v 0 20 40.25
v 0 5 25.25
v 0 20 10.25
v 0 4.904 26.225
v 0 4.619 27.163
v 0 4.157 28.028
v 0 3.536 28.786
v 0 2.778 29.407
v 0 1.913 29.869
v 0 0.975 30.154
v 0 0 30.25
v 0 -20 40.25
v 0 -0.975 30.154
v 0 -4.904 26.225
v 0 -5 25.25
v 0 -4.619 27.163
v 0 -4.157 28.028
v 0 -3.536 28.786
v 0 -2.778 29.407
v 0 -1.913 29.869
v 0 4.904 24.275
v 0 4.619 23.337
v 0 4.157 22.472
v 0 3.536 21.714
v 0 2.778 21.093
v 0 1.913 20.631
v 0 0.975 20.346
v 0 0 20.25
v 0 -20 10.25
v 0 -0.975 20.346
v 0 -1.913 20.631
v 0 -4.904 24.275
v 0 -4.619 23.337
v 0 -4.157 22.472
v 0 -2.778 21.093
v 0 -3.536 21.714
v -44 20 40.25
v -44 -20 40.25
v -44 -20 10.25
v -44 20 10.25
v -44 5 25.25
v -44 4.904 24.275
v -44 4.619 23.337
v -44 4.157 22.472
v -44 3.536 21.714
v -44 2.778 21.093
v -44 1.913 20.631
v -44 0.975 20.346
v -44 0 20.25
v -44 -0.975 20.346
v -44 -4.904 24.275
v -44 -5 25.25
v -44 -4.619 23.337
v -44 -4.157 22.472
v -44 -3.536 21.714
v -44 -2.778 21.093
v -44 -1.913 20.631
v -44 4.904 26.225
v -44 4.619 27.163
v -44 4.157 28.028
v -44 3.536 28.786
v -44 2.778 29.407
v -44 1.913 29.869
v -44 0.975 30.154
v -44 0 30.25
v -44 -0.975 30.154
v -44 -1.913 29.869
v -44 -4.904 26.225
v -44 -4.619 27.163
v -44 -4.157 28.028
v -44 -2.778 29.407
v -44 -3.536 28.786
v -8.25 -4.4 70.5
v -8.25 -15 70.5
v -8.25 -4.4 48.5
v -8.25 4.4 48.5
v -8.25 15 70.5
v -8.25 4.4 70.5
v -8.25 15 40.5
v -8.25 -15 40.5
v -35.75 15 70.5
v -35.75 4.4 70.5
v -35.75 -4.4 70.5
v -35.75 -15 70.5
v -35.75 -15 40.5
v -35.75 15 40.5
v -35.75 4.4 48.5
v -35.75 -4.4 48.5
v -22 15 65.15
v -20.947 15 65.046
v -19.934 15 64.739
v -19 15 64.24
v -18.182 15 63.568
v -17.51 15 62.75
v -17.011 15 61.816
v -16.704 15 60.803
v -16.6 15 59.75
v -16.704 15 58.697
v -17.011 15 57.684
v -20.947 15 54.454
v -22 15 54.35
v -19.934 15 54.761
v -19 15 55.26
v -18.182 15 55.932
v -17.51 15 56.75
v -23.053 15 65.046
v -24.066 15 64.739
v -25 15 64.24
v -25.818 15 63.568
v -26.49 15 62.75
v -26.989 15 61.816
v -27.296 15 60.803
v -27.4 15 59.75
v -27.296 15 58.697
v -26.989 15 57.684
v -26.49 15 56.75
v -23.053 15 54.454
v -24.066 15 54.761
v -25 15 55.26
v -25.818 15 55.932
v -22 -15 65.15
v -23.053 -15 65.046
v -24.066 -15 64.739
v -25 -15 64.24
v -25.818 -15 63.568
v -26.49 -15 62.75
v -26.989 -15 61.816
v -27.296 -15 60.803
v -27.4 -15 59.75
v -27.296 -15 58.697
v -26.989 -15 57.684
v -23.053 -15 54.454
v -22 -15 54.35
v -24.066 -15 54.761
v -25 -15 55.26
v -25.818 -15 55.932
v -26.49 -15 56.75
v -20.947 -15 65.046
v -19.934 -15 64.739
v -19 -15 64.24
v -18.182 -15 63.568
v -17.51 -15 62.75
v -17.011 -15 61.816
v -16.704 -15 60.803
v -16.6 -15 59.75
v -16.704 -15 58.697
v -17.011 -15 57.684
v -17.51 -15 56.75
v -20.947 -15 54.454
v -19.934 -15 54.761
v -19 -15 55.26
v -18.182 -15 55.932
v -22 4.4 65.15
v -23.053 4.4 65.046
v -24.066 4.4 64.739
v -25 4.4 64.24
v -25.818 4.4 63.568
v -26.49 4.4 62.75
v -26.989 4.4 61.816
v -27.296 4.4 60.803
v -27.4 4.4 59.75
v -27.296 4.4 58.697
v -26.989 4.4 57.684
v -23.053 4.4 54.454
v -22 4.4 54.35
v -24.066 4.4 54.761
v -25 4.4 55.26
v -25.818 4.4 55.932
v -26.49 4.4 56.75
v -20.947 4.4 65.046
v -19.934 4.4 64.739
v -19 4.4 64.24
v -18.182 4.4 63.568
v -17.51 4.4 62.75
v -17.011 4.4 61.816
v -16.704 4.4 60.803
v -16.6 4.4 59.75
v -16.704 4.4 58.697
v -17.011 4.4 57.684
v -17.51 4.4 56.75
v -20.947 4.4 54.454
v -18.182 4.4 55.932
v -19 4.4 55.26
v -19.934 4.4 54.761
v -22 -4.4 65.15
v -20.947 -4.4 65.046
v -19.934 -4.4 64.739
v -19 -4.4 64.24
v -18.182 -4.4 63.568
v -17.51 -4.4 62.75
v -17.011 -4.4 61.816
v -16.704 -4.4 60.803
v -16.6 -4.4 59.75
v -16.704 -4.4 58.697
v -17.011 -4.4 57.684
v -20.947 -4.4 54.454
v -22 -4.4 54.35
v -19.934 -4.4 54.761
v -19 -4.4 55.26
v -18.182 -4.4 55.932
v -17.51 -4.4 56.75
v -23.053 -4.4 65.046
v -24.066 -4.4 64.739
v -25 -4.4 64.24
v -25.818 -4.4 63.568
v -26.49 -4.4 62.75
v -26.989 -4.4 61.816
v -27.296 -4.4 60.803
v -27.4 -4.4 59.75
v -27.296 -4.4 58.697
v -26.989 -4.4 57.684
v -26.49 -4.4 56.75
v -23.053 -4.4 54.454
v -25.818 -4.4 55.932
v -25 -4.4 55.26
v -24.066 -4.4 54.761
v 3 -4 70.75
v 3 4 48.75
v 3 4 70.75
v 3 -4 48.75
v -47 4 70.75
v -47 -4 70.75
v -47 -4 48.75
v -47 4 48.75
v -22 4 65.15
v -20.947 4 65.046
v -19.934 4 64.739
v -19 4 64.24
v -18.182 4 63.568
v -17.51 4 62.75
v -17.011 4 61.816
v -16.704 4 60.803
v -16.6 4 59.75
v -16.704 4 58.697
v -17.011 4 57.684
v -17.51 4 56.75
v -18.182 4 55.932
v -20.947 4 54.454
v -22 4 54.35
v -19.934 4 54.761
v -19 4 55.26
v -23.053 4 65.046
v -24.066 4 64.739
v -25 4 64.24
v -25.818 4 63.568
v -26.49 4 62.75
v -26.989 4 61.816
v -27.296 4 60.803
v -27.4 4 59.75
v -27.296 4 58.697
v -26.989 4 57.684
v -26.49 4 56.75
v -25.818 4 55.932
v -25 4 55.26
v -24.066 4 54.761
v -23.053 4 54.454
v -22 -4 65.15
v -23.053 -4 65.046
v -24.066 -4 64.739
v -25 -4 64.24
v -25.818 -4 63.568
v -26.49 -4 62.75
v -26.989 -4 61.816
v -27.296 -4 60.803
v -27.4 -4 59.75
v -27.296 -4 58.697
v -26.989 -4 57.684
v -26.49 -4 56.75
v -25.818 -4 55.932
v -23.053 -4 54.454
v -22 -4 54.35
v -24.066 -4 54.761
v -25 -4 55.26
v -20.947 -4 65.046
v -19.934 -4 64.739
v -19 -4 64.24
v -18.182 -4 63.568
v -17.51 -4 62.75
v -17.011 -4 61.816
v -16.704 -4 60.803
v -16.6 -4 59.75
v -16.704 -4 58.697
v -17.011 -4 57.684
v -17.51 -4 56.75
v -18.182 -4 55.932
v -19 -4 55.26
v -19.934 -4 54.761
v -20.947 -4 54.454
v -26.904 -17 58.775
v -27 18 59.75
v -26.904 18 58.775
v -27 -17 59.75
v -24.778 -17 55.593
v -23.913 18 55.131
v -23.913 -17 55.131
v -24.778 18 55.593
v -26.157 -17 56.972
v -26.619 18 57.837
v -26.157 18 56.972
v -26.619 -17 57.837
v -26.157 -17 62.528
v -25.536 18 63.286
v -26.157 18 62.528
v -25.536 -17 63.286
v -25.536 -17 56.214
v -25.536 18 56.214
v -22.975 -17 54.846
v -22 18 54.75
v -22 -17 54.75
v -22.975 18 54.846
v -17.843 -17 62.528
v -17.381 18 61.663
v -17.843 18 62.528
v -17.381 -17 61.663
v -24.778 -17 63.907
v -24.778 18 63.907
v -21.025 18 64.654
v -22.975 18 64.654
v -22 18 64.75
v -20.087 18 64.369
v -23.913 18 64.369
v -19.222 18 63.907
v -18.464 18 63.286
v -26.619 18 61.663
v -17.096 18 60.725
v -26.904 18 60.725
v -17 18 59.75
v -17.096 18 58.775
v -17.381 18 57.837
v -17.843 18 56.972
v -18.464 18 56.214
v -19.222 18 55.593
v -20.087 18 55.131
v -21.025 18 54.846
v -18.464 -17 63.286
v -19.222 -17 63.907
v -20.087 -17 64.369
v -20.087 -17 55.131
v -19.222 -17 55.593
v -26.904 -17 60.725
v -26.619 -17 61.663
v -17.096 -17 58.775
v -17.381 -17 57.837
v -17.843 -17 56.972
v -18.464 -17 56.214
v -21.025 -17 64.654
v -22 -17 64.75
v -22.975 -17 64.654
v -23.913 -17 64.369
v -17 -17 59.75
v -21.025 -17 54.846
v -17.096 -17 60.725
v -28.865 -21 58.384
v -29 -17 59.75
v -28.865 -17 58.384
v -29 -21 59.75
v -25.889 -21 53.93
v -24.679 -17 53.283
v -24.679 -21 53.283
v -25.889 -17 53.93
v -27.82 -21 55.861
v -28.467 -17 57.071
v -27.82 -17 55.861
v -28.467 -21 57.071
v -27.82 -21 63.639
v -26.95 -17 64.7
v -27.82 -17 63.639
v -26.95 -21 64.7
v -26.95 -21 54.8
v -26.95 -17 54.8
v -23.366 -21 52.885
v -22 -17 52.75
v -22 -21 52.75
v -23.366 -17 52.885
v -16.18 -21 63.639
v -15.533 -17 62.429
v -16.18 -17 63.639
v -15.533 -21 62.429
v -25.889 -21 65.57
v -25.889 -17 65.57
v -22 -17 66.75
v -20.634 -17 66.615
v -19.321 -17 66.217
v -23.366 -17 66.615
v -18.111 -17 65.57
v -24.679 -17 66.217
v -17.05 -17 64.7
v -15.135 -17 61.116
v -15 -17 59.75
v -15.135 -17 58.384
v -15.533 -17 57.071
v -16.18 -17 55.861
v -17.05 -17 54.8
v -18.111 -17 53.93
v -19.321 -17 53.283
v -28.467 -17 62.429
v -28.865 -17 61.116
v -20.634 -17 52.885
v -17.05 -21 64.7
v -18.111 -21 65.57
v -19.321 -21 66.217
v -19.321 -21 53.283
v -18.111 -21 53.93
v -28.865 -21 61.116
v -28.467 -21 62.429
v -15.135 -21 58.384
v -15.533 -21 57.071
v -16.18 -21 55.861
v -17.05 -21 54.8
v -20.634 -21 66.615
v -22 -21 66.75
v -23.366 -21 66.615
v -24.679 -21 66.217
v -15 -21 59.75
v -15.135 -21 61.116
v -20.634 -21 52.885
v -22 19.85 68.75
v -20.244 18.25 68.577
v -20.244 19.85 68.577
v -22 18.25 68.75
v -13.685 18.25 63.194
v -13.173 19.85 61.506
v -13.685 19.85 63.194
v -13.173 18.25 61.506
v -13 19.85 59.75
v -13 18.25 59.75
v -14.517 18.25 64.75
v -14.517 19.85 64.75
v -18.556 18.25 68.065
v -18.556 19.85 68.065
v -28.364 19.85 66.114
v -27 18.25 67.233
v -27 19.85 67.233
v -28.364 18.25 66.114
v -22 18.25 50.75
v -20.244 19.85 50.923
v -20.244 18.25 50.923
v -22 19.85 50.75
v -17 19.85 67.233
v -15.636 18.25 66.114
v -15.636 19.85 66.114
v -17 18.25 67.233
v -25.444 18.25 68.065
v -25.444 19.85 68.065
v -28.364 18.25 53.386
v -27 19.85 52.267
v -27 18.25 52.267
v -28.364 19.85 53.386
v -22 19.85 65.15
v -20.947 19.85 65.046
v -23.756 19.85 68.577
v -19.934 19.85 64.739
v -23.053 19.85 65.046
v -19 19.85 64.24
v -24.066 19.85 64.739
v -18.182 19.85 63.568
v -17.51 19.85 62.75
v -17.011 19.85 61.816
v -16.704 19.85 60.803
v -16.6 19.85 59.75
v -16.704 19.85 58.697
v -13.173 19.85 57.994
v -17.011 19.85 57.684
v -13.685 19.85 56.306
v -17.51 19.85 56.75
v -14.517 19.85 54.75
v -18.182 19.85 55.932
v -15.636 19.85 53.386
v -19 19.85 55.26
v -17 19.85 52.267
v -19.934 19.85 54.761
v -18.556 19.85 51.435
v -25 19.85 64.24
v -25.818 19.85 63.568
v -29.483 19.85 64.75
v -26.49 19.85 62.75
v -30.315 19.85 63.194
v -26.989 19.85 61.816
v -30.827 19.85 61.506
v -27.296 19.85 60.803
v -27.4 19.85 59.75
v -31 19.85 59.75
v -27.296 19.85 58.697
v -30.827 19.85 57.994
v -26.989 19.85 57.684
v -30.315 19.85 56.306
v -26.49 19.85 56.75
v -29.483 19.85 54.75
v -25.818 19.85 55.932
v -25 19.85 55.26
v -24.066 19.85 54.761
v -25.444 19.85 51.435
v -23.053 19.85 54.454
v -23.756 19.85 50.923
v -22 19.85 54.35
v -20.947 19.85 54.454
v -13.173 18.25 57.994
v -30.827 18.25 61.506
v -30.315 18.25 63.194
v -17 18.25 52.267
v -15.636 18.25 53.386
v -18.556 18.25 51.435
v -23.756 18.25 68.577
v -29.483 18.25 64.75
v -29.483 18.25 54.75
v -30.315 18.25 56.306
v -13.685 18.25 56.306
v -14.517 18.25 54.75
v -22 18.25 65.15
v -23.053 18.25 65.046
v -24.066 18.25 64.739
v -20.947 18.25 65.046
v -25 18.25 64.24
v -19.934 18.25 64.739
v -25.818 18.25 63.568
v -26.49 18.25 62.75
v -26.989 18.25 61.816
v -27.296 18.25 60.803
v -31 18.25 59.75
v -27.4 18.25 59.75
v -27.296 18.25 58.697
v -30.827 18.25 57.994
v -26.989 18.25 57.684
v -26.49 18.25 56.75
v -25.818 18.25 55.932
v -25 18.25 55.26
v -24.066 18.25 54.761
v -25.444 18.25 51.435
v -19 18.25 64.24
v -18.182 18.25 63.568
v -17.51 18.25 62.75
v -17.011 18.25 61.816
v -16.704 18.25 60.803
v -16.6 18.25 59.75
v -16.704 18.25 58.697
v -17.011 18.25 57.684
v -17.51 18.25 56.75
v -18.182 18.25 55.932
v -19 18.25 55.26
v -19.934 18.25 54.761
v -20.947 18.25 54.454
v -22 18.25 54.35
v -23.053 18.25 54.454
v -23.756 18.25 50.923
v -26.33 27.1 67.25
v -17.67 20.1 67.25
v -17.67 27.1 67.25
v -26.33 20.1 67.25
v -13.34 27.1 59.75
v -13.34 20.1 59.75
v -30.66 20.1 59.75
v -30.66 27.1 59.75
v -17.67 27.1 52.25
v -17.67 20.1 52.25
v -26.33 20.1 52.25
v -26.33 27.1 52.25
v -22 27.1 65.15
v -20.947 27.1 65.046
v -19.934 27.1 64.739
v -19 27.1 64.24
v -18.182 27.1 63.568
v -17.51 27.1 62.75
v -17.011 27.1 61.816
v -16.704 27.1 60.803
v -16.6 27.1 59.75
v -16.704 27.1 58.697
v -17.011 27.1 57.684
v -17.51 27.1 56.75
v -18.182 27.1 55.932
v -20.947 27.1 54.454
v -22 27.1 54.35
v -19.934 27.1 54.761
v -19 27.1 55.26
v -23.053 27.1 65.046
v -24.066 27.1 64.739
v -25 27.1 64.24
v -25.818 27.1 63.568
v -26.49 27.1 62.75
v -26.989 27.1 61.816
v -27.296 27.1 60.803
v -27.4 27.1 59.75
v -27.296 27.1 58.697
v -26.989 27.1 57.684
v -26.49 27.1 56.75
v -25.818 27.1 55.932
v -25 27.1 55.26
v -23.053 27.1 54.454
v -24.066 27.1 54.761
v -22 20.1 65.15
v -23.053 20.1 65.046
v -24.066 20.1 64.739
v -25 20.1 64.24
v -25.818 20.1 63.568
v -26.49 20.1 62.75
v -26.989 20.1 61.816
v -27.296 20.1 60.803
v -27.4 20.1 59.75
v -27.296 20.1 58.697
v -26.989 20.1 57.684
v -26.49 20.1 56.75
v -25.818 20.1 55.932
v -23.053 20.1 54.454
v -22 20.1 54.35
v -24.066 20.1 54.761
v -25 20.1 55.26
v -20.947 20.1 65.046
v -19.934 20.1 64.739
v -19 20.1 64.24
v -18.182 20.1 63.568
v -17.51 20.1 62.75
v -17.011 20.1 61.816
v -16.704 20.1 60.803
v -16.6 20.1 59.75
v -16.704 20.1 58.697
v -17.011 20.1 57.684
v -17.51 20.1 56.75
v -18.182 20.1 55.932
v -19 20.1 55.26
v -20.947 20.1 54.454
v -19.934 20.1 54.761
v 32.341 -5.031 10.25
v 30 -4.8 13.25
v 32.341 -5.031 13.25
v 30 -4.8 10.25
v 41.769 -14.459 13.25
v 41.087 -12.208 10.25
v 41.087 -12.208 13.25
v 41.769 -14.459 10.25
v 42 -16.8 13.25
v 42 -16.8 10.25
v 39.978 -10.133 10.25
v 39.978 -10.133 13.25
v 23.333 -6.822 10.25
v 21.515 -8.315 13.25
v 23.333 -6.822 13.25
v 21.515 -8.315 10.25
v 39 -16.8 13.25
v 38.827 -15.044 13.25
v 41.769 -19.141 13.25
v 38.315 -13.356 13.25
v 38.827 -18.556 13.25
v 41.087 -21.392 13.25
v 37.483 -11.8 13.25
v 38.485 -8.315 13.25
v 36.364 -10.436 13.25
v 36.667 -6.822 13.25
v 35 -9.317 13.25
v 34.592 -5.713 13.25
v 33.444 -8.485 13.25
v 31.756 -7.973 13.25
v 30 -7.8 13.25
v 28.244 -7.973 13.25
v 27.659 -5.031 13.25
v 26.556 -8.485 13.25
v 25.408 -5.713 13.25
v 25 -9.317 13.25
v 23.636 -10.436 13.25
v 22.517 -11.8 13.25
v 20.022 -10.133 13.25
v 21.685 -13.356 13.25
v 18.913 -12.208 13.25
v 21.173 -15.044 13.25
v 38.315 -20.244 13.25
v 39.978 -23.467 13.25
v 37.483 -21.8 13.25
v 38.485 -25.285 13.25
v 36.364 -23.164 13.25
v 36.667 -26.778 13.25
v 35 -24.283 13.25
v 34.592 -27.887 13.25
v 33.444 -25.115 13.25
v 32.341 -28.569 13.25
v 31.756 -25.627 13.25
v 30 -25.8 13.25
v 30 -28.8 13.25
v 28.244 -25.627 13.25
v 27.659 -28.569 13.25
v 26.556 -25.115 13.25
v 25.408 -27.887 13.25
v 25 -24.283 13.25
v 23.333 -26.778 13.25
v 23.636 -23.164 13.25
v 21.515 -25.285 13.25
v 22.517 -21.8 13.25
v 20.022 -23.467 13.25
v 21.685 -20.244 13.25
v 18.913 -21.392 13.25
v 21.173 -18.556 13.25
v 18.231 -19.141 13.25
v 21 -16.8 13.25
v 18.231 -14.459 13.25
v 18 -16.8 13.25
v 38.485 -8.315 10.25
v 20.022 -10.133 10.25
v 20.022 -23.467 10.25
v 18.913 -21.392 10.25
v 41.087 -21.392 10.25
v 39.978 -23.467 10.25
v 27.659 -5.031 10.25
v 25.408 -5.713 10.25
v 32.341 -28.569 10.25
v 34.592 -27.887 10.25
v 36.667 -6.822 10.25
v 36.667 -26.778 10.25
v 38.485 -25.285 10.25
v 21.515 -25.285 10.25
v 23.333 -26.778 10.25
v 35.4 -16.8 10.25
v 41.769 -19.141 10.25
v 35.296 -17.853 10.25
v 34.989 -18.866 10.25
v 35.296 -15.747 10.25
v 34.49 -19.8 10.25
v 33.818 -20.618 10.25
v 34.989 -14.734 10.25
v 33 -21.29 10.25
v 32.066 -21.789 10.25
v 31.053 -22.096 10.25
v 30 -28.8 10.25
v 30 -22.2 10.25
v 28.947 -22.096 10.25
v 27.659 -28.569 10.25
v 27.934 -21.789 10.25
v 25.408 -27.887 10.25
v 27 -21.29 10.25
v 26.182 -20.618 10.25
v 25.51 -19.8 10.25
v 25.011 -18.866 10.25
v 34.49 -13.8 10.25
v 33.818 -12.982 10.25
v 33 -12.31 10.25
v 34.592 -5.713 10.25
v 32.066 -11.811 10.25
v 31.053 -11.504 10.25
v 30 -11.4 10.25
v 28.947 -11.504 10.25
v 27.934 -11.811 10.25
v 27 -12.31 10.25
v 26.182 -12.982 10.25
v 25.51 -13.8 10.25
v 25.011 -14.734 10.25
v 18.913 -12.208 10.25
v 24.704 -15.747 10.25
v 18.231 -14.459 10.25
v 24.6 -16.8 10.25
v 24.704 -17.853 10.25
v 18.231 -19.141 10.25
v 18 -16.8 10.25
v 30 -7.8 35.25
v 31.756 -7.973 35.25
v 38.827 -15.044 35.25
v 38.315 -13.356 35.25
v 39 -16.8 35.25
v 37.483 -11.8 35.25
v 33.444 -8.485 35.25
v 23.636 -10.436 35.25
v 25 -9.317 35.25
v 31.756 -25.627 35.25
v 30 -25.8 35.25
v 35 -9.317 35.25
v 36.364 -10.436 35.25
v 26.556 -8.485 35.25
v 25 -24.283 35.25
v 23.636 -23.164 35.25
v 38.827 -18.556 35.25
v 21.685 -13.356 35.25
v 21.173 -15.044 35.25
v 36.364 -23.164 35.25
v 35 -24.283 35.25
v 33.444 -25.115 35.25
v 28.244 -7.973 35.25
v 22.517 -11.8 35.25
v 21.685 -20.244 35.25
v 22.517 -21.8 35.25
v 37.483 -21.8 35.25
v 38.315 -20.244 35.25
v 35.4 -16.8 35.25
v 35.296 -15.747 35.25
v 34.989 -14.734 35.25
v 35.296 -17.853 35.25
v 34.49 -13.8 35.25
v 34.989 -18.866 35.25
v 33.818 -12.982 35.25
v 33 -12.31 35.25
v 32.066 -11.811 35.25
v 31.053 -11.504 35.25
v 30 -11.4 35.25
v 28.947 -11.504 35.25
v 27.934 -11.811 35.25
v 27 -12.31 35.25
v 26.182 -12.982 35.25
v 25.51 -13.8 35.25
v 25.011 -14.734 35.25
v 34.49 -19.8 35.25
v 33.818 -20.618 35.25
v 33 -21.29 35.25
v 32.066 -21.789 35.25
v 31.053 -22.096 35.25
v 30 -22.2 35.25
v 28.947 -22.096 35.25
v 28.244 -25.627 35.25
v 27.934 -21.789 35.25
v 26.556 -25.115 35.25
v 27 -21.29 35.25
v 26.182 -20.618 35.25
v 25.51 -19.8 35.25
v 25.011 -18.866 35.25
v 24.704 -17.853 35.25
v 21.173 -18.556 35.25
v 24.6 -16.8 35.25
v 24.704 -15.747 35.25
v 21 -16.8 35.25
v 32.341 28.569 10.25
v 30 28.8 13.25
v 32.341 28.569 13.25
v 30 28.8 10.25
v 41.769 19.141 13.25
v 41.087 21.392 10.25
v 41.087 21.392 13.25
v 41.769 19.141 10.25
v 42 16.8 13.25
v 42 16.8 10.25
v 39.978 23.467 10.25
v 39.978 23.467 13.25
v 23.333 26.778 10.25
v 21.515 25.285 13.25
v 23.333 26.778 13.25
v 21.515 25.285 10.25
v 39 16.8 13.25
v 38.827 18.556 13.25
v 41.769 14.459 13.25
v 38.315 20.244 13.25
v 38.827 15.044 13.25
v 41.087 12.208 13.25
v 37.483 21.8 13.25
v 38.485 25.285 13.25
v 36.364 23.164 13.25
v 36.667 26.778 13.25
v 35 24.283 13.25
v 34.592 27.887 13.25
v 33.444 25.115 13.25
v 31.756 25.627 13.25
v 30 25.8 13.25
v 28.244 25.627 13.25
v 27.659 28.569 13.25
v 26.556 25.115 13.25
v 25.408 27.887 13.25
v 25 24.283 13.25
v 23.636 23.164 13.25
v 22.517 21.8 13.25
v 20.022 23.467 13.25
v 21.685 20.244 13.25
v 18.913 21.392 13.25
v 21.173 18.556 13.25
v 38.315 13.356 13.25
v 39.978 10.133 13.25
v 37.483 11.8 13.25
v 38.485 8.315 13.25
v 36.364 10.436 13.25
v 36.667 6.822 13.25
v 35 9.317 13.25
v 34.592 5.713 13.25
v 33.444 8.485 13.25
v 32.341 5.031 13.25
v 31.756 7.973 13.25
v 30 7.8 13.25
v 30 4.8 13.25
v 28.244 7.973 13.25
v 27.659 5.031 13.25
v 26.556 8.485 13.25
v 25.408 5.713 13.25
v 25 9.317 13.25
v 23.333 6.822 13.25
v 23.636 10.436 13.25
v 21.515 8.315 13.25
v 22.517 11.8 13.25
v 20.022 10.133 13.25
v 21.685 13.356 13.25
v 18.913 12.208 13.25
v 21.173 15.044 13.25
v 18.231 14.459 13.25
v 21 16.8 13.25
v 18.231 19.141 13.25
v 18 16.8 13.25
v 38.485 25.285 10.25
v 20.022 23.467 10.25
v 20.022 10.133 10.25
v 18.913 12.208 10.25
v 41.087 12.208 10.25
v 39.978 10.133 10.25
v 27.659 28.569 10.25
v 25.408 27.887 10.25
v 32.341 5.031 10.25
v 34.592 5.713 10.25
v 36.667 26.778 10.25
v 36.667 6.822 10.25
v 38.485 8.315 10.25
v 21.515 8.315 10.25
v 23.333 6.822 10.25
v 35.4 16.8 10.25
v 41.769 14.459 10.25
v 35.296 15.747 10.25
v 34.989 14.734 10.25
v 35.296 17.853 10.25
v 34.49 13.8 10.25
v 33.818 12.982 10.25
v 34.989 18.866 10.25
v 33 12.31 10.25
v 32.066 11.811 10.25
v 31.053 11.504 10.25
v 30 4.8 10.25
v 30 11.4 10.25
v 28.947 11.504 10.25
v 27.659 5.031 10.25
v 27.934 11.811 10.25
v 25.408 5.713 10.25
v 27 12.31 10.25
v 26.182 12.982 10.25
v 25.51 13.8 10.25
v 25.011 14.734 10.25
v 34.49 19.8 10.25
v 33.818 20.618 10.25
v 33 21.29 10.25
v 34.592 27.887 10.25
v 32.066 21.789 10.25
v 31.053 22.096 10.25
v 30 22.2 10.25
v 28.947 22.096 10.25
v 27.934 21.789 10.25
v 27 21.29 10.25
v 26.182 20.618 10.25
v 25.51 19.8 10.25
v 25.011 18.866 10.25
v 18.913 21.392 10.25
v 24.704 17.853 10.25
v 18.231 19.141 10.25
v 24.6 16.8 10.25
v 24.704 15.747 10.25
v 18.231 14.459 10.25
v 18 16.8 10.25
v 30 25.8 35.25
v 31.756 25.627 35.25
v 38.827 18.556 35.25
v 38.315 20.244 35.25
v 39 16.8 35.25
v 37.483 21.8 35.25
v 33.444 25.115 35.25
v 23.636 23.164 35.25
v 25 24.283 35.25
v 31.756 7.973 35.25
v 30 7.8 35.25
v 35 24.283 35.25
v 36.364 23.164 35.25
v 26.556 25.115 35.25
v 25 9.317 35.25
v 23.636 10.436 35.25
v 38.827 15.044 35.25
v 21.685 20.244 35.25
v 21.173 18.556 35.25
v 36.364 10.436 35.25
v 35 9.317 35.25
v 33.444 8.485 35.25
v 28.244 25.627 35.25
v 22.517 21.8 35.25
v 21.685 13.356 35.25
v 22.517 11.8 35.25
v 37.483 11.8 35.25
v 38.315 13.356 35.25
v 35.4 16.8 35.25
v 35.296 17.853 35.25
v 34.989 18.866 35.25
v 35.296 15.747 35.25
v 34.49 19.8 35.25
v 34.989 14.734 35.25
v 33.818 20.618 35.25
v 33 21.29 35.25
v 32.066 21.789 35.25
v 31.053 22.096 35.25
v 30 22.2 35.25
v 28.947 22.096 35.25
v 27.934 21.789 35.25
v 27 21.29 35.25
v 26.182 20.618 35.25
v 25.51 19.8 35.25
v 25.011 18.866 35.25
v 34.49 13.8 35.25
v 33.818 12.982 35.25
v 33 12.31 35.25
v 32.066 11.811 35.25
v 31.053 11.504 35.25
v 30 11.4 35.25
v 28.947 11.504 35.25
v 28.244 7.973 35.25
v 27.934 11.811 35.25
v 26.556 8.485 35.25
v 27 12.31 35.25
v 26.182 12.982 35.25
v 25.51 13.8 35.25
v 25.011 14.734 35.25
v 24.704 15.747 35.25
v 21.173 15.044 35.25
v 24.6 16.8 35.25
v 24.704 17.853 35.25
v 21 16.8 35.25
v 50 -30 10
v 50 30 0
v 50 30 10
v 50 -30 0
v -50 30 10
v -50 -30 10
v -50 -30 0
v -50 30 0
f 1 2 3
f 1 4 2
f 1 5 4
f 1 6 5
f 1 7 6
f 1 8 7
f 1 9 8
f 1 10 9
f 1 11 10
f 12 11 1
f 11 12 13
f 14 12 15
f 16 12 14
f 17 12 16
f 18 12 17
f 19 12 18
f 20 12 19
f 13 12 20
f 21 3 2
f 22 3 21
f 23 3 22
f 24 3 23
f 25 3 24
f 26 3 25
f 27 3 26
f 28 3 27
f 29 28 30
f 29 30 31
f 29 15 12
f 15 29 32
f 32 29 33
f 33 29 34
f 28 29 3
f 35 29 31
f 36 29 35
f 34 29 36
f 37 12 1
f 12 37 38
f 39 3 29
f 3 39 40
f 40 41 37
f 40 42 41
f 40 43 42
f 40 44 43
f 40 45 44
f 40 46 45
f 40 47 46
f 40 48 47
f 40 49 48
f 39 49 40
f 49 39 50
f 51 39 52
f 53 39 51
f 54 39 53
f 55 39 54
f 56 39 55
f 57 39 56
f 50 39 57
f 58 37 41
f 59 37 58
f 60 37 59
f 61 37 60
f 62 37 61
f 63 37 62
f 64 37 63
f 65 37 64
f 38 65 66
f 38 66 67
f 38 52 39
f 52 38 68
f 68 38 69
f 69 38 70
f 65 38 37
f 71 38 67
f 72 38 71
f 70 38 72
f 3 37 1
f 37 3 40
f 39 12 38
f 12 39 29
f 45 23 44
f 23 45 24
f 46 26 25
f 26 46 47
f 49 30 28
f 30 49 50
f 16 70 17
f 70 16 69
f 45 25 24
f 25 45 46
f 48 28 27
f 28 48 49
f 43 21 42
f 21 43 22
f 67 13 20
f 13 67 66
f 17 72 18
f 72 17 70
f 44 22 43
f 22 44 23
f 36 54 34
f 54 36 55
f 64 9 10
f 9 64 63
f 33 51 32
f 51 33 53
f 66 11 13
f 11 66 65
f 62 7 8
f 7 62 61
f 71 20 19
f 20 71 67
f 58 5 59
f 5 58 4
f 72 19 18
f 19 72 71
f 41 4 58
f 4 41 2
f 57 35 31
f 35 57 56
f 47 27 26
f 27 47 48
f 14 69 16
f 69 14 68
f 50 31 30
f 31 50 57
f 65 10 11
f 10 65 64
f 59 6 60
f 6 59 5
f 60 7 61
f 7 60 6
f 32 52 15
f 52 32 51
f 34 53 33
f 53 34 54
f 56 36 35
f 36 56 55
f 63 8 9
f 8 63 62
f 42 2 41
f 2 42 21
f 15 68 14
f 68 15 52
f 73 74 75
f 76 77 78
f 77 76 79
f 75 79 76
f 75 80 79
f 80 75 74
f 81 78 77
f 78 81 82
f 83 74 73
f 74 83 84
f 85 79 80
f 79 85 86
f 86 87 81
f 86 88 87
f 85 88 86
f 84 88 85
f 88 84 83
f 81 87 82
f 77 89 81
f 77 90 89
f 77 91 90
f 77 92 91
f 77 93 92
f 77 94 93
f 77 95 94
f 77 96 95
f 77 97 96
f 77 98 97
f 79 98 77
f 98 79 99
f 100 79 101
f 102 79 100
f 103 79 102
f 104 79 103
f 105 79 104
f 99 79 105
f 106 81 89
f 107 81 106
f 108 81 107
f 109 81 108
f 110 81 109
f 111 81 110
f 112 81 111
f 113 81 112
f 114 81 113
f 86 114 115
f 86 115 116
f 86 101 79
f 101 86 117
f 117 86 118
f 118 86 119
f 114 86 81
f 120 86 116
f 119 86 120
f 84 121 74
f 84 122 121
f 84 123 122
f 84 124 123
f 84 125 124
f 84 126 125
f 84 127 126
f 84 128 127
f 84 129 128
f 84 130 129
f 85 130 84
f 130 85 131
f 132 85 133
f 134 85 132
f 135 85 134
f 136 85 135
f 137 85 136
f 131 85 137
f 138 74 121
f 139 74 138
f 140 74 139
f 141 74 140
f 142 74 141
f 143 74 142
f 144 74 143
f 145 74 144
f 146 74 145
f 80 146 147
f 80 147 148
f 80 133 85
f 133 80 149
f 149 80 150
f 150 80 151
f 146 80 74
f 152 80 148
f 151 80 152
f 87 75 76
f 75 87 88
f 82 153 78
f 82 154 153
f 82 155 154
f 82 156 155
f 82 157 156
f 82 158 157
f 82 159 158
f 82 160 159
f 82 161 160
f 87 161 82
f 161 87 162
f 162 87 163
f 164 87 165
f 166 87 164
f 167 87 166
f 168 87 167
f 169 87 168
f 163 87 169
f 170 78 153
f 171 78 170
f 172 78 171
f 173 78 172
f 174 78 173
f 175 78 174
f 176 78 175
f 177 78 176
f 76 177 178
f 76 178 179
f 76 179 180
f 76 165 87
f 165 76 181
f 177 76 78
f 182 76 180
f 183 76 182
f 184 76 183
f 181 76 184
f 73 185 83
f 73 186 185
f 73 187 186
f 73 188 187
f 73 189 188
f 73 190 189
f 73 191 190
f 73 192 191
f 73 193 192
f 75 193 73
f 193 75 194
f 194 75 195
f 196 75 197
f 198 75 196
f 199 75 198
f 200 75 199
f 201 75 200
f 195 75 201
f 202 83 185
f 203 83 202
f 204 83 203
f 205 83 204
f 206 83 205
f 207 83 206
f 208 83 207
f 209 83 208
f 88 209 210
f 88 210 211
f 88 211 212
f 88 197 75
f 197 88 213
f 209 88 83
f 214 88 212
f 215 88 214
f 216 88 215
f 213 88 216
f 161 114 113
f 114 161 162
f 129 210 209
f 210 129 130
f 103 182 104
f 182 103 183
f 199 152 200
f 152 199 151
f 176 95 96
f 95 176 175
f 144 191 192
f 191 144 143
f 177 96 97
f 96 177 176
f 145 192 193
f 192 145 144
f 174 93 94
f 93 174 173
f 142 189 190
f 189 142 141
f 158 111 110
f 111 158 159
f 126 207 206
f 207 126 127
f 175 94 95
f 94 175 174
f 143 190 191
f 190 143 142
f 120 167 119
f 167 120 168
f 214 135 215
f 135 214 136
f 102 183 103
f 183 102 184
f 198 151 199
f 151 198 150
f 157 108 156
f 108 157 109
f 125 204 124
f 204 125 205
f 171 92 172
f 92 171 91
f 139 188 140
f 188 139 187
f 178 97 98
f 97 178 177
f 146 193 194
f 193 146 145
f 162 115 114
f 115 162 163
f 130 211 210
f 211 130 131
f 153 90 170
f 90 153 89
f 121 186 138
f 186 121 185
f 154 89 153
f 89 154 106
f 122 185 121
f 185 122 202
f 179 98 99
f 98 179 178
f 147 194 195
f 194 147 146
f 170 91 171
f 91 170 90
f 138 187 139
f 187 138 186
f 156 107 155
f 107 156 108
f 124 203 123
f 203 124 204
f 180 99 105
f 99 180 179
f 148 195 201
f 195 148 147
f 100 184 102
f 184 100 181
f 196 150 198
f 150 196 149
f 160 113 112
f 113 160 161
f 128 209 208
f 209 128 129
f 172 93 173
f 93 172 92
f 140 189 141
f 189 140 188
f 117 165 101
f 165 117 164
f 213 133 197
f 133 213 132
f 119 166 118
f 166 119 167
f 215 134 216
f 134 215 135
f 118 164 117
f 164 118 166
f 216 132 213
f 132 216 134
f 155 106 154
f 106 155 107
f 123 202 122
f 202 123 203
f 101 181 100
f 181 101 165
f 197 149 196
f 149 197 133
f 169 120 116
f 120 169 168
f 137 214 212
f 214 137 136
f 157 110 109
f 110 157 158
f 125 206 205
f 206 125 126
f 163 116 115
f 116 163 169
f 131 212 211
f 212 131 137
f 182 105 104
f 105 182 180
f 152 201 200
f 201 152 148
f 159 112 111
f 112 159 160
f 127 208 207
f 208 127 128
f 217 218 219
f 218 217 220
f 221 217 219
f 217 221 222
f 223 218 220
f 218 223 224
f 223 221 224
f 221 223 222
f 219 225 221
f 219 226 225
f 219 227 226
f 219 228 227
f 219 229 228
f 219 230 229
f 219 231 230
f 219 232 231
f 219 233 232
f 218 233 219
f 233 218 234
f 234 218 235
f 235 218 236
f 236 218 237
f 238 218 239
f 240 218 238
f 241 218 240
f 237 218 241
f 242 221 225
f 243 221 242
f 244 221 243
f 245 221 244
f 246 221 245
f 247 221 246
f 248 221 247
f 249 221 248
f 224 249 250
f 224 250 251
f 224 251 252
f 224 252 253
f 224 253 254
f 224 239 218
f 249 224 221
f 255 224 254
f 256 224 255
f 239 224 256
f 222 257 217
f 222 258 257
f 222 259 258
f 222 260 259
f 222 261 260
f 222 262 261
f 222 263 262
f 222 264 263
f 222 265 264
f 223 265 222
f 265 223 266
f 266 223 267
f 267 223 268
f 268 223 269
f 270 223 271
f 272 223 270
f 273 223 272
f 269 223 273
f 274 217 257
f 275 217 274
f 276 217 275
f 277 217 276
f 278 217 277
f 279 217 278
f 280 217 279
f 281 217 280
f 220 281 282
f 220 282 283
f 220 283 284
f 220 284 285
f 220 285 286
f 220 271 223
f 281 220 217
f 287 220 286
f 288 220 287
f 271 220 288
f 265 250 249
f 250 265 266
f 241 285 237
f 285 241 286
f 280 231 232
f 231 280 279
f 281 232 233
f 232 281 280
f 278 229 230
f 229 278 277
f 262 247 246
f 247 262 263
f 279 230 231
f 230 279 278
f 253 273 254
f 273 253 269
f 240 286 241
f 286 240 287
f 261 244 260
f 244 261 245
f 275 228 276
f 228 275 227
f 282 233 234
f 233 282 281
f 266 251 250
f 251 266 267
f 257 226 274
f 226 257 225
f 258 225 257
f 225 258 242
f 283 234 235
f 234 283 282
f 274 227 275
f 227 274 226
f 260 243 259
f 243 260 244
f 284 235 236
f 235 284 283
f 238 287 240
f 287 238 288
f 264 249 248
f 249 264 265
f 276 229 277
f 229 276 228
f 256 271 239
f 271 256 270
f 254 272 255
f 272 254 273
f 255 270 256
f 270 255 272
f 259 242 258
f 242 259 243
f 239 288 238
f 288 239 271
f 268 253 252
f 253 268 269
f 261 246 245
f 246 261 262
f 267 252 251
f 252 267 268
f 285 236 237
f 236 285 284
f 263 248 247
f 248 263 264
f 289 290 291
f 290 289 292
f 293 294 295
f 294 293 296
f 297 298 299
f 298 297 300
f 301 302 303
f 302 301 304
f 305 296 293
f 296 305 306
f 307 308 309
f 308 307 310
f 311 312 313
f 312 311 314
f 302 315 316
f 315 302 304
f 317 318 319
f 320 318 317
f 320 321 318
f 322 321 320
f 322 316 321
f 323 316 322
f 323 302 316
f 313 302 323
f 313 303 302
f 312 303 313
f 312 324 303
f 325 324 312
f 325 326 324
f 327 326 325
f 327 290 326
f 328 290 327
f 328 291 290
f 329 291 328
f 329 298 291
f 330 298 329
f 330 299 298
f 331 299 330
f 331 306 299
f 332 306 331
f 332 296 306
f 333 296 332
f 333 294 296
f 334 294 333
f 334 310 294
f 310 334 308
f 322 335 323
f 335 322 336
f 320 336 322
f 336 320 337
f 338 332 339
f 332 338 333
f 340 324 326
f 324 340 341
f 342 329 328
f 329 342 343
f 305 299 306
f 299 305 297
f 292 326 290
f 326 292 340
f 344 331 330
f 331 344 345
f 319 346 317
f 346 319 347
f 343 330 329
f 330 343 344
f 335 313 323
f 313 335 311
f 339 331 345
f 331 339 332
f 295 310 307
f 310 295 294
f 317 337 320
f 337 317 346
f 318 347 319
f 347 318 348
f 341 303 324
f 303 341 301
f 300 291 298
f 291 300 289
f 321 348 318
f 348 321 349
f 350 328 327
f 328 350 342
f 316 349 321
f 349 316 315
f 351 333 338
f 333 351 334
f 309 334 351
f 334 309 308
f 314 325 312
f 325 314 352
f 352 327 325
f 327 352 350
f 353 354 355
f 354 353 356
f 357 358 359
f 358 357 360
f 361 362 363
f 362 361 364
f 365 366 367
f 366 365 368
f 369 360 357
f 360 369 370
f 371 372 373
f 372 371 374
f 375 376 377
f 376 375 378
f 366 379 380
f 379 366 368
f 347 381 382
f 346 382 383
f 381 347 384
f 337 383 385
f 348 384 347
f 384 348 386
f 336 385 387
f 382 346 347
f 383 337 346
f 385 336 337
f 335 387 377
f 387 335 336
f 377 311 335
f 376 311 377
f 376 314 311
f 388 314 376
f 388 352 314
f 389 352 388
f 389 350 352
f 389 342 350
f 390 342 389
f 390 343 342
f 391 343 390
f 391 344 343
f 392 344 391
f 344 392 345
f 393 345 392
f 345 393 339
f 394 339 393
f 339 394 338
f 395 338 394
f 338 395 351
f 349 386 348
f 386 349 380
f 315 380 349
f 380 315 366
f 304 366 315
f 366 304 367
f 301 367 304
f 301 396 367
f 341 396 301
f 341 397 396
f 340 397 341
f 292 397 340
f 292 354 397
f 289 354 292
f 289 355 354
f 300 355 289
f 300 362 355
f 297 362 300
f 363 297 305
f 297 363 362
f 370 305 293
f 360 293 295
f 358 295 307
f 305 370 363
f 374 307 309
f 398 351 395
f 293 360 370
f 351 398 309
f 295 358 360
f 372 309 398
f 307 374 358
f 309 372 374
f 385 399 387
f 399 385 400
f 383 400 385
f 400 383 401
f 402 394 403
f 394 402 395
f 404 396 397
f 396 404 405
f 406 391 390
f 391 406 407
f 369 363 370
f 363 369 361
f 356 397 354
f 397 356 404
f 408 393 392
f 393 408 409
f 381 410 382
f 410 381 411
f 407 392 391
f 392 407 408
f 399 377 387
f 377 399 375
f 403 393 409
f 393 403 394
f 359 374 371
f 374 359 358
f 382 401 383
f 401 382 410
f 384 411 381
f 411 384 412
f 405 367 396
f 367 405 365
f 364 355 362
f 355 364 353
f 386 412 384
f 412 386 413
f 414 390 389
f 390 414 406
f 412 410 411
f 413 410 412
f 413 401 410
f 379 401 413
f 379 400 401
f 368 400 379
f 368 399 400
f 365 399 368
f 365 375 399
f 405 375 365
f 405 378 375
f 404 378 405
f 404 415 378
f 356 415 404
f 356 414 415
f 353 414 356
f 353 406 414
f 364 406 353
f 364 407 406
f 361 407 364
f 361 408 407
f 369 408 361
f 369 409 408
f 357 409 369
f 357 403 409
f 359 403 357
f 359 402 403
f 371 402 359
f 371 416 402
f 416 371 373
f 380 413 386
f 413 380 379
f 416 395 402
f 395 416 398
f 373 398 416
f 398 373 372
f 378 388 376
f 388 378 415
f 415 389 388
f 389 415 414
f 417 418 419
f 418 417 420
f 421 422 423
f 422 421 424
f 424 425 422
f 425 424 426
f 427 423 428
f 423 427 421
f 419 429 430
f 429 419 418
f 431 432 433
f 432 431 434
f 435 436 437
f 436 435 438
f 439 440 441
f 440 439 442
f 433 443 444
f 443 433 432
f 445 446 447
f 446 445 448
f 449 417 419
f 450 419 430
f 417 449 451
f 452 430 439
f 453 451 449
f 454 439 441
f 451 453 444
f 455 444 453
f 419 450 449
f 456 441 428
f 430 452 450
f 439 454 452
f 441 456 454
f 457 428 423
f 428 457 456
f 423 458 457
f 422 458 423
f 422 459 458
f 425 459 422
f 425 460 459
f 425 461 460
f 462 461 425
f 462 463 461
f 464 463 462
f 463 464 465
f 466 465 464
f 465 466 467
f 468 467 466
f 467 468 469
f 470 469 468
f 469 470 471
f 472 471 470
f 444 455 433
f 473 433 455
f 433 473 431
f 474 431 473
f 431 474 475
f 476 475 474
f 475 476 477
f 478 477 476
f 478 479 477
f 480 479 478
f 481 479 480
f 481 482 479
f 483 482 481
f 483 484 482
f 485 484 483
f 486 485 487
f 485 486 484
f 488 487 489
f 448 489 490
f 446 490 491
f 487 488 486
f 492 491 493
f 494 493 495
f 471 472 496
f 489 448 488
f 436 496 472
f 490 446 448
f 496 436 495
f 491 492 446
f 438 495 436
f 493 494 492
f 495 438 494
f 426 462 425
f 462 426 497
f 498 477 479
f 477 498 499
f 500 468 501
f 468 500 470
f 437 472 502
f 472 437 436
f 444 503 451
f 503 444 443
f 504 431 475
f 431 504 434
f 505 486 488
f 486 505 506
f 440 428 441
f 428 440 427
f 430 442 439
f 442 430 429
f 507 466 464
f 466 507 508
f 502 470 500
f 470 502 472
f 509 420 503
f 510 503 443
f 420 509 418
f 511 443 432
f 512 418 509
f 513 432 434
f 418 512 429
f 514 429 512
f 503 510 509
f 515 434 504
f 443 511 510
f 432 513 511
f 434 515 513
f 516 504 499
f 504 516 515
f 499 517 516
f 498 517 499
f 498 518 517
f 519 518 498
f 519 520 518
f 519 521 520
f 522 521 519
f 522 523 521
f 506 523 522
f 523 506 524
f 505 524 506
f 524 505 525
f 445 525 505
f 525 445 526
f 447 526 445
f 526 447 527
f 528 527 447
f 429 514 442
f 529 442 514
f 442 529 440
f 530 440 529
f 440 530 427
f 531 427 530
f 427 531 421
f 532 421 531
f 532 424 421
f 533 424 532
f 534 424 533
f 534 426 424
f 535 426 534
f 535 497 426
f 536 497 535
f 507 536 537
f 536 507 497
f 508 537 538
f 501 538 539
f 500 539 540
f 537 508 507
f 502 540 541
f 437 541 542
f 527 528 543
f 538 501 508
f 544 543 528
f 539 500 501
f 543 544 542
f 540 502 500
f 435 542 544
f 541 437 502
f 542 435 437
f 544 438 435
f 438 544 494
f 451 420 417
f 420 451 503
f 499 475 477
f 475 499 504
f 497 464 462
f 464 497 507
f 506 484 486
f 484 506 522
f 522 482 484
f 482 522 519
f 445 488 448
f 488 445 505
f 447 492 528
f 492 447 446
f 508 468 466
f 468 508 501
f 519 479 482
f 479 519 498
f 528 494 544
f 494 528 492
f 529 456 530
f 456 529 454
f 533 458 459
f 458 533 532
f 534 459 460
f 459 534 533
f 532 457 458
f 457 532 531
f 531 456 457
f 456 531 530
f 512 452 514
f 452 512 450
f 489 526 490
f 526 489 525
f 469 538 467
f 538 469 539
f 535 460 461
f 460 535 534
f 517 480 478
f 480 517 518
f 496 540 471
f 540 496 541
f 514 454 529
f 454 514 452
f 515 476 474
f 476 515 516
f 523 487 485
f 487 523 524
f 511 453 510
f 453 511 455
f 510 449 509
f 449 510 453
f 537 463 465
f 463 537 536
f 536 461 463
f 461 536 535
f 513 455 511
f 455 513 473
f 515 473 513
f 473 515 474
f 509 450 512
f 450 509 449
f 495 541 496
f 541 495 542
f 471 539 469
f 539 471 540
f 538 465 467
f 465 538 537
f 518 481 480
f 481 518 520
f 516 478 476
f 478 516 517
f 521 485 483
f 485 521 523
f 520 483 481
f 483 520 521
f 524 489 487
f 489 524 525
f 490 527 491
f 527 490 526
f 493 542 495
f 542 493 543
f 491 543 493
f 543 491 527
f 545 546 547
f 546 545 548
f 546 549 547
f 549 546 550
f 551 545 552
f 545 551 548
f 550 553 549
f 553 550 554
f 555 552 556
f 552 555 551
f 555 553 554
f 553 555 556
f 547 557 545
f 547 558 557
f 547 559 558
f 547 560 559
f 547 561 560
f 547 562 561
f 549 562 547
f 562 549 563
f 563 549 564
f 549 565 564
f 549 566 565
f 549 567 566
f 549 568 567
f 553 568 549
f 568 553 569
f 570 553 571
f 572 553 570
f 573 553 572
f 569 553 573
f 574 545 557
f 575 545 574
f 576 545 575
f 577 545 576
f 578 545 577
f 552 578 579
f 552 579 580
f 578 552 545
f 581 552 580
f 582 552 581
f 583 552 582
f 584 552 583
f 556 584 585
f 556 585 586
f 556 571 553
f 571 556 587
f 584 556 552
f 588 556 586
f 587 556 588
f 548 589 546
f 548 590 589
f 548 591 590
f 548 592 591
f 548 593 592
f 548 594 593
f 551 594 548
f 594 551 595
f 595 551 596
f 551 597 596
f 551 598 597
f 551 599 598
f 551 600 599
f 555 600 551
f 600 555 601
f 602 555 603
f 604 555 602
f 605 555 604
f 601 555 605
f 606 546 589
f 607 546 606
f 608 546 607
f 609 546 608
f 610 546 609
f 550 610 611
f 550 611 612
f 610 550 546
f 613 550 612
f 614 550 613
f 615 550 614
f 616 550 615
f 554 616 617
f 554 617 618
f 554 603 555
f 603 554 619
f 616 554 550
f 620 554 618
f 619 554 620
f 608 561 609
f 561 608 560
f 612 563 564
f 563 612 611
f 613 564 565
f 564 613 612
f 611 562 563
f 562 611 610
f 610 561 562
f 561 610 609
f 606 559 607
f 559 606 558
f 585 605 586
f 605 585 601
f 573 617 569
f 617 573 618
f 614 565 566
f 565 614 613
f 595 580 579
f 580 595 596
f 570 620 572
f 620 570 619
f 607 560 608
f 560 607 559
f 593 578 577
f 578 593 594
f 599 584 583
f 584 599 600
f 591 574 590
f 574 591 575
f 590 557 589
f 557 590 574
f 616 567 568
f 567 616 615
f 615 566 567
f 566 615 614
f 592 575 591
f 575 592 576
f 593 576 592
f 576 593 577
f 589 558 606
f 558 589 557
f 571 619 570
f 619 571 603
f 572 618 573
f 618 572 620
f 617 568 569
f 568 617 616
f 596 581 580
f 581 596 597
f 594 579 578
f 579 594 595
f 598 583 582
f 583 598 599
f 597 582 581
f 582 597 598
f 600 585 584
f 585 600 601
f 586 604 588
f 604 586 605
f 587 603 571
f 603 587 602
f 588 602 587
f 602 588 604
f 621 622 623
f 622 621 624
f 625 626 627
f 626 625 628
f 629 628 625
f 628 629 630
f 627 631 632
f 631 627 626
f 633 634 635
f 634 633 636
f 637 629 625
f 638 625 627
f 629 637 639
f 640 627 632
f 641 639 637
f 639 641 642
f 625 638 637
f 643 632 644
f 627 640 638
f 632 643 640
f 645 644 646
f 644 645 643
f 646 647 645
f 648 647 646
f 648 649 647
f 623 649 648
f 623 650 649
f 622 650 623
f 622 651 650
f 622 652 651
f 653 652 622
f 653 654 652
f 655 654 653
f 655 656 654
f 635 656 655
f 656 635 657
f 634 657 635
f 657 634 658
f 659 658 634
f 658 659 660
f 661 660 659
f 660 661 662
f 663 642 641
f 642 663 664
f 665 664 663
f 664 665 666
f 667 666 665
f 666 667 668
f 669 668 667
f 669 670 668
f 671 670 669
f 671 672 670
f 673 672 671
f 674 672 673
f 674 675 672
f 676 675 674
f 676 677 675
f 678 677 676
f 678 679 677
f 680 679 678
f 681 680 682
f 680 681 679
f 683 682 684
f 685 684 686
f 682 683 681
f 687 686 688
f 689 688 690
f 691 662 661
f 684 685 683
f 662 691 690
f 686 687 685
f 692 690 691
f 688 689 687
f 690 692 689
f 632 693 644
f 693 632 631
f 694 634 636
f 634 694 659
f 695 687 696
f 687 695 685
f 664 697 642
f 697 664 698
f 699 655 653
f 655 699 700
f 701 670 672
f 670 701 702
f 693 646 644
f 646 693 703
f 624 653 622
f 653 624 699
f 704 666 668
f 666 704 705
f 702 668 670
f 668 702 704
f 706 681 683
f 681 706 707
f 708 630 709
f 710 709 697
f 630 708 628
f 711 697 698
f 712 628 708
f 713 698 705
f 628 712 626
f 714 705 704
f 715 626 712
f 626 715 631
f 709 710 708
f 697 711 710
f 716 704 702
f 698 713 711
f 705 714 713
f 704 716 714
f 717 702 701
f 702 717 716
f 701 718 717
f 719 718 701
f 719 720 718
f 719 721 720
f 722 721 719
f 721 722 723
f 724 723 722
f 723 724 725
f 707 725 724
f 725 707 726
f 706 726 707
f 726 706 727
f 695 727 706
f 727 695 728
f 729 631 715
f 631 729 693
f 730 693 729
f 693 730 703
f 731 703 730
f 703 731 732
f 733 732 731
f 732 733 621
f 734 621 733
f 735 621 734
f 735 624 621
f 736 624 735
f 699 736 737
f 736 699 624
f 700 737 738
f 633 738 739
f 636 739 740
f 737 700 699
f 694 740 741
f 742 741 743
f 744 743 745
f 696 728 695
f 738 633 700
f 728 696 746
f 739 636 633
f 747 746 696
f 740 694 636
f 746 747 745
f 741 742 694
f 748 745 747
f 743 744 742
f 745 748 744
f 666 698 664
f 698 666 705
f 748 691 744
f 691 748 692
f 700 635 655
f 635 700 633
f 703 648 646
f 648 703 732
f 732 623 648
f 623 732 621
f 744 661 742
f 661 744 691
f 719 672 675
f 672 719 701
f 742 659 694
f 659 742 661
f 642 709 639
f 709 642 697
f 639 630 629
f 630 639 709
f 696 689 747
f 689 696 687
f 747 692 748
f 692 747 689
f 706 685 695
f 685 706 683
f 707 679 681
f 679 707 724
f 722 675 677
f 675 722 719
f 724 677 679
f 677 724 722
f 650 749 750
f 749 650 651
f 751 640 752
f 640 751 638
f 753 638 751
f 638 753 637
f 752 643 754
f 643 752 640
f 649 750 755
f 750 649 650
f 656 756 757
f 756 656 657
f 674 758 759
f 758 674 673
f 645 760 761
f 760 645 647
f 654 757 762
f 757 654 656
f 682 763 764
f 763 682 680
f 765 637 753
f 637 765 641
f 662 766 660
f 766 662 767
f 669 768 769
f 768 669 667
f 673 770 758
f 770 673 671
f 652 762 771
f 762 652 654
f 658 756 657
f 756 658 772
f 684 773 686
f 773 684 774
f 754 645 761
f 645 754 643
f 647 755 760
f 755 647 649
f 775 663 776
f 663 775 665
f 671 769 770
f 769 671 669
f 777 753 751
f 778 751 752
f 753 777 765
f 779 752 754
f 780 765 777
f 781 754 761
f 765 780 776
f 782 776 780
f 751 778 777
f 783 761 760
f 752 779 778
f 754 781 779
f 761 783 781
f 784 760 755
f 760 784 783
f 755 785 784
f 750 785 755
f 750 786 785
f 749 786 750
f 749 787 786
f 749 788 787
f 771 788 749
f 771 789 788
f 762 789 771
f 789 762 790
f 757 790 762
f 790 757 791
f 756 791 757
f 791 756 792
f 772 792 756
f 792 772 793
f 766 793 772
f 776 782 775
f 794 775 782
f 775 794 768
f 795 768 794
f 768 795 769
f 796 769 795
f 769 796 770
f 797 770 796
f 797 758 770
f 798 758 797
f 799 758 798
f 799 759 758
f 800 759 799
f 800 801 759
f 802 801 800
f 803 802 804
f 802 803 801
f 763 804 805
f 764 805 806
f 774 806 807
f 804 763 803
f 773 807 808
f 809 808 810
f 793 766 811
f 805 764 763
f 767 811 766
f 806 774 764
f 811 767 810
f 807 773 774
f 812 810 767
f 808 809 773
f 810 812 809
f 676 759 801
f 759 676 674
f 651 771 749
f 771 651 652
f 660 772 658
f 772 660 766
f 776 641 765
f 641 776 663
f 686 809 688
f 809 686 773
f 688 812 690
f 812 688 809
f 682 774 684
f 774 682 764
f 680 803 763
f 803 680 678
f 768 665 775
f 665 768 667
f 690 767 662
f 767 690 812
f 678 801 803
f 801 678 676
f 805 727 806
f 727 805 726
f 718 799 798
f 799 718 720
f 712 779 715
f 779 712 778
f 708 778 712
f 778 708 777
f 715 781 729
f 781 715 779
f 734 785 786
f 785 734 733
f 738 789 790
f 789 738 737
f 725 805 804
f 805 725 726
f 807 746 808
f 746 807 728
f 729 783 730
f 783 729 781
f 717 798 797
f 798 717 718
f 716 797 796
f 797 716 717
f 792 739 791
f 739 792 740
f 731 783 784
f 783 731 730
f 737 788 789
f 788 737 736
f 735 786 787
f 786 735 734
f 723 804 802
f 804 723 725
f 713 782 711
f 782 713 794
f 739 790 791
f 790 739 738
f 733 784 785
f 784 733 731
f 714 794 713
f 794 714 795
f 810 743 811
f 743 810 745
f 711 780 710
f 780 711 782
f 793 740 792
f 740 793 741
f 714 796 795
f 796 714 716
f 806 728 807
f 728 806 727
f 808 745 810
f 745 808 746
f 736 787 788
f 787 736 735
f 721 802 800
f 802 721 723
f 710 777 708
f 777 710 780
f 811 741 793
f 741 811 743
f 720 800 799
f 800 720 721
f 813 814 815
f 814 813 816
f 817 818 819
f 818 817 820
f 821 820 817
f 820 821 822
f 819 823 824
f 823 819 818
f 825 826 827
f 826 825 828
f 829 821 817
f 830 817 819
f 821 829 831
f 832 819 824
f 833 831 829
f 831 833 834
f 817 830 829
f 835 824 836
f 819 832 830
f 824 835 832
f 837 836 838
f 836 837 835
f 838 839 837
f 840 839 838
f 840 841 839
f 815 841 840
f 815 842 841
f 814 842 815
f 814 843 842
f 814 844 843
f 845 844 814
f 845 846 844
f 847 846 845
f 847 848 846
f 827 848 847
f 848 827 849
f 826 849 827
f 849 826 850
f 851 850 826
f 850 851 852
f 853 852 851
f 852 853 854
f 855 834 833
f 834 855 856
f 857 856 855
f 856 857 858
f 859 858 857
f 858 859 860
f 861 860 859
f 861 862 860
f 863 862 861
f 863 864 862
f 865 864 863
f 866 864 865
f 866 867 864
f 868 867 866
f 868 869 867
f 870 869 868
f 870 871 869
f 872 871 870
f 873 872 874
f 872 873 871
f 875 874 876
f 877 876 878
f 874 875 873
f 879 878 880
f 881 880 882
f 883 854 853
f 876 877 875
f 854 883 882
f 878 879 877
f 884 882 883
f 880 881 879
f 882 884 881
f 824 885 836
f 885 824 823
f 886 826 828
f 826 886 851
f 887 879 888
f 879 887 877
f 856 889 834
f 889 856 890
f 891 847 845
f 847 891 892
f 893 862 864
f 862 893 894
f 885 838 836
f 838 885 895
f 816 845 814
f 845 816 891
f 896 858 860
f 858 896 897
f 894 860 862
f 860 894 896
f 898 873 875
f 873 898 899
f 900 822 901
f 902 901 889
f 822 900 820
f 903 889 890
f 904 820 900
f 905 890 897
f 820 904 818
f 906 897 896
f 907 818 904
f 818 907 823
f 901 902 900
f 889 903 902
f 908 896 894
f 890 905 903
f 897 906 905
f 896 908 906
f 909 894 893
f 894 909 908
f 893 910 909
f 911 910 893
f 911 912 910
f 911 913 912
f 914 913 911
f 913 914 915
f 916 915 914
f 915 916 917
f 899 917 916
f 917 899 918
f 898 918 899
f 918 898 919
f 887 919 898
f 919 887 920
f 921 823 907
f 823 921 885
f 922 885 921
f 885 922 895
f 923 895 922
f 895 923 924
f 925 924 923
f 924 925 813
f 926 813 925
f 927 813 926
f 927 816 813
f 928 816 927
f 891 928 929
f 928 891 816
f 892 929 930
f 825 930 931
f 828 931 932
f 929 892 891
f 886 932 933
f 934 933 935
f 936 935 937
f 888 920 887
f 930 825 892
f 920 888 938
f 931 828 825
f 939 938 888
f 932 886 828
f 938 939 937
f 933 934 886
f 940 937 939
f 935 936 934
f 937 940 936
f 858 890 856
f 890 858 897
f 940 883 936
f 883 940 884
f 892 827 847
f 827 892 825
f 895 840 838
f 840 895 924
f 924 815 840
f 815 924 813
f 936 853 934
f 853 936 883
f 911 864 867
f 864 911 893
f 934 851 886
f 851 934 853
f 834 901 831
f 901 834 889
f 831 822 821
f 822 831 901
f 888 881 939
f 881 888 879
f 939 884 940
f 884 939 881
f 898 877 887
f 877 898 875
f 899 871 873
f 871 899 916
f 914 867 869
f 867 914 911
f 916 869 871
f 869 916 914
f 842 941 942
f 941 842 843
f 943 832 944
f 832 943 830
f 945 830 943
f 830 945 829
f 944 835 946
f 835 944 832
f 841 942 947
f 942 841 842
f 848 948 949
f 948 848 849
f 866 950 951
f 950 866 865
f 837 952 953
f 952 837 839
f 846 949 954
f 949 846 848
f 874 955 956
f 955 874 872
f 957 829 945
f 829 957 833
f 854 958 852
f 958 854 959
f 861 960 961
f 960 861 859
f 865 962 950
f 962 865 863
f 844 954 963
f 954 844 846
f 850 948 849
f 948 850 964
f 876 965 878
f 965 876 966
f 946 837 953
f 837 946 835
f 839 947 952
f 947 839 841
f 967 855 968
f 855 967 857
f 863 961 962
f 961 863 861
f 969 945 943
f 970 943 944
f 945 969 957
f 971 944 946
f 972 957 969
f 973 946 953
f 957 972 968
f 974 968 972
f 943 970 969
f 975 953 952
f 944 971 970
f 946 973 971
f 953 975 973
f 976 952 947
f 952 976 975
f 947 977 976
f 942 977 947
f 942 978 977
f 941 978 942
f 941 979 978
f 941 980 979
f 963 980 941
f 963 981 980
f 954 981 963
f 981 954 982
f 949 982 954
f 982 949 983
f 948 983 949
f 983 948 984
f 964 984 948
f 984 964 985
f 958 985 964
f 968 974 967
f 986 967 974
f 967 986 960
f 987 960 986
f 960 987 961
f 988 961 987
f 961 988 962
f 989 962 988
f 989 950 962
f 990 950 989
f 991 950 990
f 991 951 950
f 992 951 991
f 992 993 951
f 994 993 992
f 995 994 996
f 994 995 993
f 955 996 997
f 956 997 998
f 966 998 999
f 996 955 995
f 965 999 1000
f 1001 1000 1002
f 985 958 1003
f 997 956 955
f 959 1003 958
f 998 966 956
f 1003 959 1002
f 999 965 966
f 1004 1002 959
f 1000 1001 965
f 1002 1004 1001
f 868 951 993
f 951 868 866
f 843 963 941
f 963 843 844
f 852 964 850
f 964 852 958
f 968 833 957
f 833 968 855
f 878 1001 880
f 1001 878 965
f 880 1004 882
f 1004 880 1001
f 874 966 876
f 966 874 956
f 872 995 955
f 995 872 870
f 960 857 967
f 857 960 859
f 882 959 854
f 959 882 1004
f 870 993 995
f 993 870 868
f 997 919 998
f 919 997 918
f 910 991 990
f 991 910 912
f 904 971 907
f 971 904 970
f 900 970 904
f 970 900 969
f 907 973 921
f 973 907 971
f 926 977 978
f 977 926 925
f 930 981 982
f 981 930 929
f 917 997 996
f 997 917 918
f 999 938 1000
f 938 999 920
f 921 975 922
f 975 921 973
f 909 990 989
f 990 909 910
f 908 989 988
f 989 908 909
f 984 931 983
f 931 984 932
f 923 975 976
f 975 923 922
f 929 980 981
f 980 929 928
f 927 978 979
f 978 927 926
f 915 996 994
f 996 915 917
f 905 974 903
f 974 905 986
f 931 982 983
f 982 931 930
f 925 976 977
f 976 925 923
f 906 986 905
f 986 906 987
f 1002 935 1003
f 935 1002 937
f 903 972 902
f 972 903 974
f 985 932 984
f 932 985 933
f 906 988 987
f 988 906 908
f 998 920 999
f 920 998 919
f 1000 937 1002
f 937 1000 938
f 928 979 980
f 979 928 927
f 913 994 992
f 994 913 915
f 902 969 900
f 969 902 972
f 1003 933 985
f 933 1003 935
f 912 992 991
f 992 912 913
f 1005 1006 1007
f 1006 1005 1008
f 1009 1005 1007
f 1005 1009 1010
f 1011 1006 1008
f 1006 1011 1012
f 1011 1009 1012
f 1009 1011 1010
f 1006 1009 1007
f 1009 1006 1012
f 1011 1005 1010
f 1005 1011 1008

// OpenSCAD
$fn = 32;

// ------------------------------------------------------------------------
// Indexing jig: plate 100 x 60 mm, pin d10
// Every part is its own module, assembly() places every instance.
// ------------------------------------------------------------------------

// --- part 1 ---
module jig_plate() {
  difference() {
    translate([-50, -30, 0]) cube([100, 60, 10]);
  }
}

// --- part 2 ---
module locator_block() {
  difference() {
    translate([-22, -20, 0]) cube([44, 40, 30]);
    translate([0, 0, 15]) rotate([0, 90, 0]) cylinder(h = 46, d = 10, center = true);
  }
}

// --- part 3 ---
module index_fork() {
  difference() {
    translate([-13.75, -15, 0]) cube([27.5, 30, 30]);
    translate([-14.75, -4.4, 8]) cube([29.5, 8.8, 23]);
    translate([0, 0, 19.25]) rotate([90, 0, 0]) cylinder(h = 32, d = 10.8, center = true);
  }
}

// --- part 4 ---
module index_arm() {
  difference() {
    translate([-25, -4, 0]) cube([50, 8, 22]);
    translate([0, 0, 11]) rotate([90, 0, 0]) cylinder(h = 10, d = 10.8, center = true);
  }
}

// --- part 5 ---
module index_pin() {
  rotate([0, 90, 0]) cylinder(h = 36, d = 10, center = true);
  translate([-21, 0, 0]) rotate([0, 90, 0]) cylinder(h = 4, d = 14);
}

// --- part 6 ---
module pin_washer() {
  difference() {
      translate([0, 0, 0]) cylinder(h = 1.6, d = 18);
      translate([0, 0, -1]) cylinder(h = 3.6, d = 10.8);
    }
}

// --- part 7 ---
module lock_nut() {
  difference() {
    linear_extrude(height = 7) polygon(points = [[8.66, 0], [4.33, 7.5], [-4.33, 7.5], [-8.66, 0], [-4.33, -7.5], [4.33, -7.5]]);
    translate([0, 0, -1]) cylinder(h = 9, d = 10.8);
  }
}

// --- part 8 ---
module guide_bush_a() {
  difference() {
    union() {
      cylinder(h = 3, d = 24);
      translate([0, 0, 3]) cylinder(h = 22, d = 18);
    }
    translate([0, 0, -1]) cylinder(h = 27, d = 10.8);
  }
}

// --- part 9 ---
module guide_bush_b() {
  difference() {
    union() {
      cylinder(h = 3, d = 24);
      translate([0, 0, 3]) cylinder(h = 22, d = 18);
    }
    translate([0, 0, -1]) cylinder(h = 27, d = 10.8);
  }
}

// --- assembly ---
module assembly() {
  color([0.80, 0.24, 0.20]) translate([0, 0, 0]) rotate([0, 0, 0]) jig_plate();
  color([0.20, 0.45, 0.75]) translate([-22, 0, 10.25]) rotate([0, 0, 0]) locator_block();
  color([0.25, 0.62, 0.32]) translate([-22, 0, 40.5]) rotate([0, 0, 0]) index_fork();
  color([0.92, 0.70, 0.18]) translate([-22, 0, 48.75]) rotate([0, 0, 0]) index_arm();
  color([0.58, 0.35, 0.70]) translate([-22, 0, 59.75]) rotate([0, 0, 90]) index_pin();
  color([0.16, 0.66, 0.66]) translate([-22, 19.85, 59.75]) rotate([90, 0, 0]) pin_washer();
  color([0.85, 0.48, 0.18]) translate([-22, 27.1, 59.75]) rotate([90, 0, 0]) lock_nut();
  color([0.55, 0.60, 0.65]) translate([30, -16.8, 10.25]) rotate([0, 0, 0]) guide_bush_a();
  color([0.75, 0.30, 0.55]) translate([30, 16.8, 10.25]) rotate([0, 0, 0]) guide_bush_b();
}

assembly();
